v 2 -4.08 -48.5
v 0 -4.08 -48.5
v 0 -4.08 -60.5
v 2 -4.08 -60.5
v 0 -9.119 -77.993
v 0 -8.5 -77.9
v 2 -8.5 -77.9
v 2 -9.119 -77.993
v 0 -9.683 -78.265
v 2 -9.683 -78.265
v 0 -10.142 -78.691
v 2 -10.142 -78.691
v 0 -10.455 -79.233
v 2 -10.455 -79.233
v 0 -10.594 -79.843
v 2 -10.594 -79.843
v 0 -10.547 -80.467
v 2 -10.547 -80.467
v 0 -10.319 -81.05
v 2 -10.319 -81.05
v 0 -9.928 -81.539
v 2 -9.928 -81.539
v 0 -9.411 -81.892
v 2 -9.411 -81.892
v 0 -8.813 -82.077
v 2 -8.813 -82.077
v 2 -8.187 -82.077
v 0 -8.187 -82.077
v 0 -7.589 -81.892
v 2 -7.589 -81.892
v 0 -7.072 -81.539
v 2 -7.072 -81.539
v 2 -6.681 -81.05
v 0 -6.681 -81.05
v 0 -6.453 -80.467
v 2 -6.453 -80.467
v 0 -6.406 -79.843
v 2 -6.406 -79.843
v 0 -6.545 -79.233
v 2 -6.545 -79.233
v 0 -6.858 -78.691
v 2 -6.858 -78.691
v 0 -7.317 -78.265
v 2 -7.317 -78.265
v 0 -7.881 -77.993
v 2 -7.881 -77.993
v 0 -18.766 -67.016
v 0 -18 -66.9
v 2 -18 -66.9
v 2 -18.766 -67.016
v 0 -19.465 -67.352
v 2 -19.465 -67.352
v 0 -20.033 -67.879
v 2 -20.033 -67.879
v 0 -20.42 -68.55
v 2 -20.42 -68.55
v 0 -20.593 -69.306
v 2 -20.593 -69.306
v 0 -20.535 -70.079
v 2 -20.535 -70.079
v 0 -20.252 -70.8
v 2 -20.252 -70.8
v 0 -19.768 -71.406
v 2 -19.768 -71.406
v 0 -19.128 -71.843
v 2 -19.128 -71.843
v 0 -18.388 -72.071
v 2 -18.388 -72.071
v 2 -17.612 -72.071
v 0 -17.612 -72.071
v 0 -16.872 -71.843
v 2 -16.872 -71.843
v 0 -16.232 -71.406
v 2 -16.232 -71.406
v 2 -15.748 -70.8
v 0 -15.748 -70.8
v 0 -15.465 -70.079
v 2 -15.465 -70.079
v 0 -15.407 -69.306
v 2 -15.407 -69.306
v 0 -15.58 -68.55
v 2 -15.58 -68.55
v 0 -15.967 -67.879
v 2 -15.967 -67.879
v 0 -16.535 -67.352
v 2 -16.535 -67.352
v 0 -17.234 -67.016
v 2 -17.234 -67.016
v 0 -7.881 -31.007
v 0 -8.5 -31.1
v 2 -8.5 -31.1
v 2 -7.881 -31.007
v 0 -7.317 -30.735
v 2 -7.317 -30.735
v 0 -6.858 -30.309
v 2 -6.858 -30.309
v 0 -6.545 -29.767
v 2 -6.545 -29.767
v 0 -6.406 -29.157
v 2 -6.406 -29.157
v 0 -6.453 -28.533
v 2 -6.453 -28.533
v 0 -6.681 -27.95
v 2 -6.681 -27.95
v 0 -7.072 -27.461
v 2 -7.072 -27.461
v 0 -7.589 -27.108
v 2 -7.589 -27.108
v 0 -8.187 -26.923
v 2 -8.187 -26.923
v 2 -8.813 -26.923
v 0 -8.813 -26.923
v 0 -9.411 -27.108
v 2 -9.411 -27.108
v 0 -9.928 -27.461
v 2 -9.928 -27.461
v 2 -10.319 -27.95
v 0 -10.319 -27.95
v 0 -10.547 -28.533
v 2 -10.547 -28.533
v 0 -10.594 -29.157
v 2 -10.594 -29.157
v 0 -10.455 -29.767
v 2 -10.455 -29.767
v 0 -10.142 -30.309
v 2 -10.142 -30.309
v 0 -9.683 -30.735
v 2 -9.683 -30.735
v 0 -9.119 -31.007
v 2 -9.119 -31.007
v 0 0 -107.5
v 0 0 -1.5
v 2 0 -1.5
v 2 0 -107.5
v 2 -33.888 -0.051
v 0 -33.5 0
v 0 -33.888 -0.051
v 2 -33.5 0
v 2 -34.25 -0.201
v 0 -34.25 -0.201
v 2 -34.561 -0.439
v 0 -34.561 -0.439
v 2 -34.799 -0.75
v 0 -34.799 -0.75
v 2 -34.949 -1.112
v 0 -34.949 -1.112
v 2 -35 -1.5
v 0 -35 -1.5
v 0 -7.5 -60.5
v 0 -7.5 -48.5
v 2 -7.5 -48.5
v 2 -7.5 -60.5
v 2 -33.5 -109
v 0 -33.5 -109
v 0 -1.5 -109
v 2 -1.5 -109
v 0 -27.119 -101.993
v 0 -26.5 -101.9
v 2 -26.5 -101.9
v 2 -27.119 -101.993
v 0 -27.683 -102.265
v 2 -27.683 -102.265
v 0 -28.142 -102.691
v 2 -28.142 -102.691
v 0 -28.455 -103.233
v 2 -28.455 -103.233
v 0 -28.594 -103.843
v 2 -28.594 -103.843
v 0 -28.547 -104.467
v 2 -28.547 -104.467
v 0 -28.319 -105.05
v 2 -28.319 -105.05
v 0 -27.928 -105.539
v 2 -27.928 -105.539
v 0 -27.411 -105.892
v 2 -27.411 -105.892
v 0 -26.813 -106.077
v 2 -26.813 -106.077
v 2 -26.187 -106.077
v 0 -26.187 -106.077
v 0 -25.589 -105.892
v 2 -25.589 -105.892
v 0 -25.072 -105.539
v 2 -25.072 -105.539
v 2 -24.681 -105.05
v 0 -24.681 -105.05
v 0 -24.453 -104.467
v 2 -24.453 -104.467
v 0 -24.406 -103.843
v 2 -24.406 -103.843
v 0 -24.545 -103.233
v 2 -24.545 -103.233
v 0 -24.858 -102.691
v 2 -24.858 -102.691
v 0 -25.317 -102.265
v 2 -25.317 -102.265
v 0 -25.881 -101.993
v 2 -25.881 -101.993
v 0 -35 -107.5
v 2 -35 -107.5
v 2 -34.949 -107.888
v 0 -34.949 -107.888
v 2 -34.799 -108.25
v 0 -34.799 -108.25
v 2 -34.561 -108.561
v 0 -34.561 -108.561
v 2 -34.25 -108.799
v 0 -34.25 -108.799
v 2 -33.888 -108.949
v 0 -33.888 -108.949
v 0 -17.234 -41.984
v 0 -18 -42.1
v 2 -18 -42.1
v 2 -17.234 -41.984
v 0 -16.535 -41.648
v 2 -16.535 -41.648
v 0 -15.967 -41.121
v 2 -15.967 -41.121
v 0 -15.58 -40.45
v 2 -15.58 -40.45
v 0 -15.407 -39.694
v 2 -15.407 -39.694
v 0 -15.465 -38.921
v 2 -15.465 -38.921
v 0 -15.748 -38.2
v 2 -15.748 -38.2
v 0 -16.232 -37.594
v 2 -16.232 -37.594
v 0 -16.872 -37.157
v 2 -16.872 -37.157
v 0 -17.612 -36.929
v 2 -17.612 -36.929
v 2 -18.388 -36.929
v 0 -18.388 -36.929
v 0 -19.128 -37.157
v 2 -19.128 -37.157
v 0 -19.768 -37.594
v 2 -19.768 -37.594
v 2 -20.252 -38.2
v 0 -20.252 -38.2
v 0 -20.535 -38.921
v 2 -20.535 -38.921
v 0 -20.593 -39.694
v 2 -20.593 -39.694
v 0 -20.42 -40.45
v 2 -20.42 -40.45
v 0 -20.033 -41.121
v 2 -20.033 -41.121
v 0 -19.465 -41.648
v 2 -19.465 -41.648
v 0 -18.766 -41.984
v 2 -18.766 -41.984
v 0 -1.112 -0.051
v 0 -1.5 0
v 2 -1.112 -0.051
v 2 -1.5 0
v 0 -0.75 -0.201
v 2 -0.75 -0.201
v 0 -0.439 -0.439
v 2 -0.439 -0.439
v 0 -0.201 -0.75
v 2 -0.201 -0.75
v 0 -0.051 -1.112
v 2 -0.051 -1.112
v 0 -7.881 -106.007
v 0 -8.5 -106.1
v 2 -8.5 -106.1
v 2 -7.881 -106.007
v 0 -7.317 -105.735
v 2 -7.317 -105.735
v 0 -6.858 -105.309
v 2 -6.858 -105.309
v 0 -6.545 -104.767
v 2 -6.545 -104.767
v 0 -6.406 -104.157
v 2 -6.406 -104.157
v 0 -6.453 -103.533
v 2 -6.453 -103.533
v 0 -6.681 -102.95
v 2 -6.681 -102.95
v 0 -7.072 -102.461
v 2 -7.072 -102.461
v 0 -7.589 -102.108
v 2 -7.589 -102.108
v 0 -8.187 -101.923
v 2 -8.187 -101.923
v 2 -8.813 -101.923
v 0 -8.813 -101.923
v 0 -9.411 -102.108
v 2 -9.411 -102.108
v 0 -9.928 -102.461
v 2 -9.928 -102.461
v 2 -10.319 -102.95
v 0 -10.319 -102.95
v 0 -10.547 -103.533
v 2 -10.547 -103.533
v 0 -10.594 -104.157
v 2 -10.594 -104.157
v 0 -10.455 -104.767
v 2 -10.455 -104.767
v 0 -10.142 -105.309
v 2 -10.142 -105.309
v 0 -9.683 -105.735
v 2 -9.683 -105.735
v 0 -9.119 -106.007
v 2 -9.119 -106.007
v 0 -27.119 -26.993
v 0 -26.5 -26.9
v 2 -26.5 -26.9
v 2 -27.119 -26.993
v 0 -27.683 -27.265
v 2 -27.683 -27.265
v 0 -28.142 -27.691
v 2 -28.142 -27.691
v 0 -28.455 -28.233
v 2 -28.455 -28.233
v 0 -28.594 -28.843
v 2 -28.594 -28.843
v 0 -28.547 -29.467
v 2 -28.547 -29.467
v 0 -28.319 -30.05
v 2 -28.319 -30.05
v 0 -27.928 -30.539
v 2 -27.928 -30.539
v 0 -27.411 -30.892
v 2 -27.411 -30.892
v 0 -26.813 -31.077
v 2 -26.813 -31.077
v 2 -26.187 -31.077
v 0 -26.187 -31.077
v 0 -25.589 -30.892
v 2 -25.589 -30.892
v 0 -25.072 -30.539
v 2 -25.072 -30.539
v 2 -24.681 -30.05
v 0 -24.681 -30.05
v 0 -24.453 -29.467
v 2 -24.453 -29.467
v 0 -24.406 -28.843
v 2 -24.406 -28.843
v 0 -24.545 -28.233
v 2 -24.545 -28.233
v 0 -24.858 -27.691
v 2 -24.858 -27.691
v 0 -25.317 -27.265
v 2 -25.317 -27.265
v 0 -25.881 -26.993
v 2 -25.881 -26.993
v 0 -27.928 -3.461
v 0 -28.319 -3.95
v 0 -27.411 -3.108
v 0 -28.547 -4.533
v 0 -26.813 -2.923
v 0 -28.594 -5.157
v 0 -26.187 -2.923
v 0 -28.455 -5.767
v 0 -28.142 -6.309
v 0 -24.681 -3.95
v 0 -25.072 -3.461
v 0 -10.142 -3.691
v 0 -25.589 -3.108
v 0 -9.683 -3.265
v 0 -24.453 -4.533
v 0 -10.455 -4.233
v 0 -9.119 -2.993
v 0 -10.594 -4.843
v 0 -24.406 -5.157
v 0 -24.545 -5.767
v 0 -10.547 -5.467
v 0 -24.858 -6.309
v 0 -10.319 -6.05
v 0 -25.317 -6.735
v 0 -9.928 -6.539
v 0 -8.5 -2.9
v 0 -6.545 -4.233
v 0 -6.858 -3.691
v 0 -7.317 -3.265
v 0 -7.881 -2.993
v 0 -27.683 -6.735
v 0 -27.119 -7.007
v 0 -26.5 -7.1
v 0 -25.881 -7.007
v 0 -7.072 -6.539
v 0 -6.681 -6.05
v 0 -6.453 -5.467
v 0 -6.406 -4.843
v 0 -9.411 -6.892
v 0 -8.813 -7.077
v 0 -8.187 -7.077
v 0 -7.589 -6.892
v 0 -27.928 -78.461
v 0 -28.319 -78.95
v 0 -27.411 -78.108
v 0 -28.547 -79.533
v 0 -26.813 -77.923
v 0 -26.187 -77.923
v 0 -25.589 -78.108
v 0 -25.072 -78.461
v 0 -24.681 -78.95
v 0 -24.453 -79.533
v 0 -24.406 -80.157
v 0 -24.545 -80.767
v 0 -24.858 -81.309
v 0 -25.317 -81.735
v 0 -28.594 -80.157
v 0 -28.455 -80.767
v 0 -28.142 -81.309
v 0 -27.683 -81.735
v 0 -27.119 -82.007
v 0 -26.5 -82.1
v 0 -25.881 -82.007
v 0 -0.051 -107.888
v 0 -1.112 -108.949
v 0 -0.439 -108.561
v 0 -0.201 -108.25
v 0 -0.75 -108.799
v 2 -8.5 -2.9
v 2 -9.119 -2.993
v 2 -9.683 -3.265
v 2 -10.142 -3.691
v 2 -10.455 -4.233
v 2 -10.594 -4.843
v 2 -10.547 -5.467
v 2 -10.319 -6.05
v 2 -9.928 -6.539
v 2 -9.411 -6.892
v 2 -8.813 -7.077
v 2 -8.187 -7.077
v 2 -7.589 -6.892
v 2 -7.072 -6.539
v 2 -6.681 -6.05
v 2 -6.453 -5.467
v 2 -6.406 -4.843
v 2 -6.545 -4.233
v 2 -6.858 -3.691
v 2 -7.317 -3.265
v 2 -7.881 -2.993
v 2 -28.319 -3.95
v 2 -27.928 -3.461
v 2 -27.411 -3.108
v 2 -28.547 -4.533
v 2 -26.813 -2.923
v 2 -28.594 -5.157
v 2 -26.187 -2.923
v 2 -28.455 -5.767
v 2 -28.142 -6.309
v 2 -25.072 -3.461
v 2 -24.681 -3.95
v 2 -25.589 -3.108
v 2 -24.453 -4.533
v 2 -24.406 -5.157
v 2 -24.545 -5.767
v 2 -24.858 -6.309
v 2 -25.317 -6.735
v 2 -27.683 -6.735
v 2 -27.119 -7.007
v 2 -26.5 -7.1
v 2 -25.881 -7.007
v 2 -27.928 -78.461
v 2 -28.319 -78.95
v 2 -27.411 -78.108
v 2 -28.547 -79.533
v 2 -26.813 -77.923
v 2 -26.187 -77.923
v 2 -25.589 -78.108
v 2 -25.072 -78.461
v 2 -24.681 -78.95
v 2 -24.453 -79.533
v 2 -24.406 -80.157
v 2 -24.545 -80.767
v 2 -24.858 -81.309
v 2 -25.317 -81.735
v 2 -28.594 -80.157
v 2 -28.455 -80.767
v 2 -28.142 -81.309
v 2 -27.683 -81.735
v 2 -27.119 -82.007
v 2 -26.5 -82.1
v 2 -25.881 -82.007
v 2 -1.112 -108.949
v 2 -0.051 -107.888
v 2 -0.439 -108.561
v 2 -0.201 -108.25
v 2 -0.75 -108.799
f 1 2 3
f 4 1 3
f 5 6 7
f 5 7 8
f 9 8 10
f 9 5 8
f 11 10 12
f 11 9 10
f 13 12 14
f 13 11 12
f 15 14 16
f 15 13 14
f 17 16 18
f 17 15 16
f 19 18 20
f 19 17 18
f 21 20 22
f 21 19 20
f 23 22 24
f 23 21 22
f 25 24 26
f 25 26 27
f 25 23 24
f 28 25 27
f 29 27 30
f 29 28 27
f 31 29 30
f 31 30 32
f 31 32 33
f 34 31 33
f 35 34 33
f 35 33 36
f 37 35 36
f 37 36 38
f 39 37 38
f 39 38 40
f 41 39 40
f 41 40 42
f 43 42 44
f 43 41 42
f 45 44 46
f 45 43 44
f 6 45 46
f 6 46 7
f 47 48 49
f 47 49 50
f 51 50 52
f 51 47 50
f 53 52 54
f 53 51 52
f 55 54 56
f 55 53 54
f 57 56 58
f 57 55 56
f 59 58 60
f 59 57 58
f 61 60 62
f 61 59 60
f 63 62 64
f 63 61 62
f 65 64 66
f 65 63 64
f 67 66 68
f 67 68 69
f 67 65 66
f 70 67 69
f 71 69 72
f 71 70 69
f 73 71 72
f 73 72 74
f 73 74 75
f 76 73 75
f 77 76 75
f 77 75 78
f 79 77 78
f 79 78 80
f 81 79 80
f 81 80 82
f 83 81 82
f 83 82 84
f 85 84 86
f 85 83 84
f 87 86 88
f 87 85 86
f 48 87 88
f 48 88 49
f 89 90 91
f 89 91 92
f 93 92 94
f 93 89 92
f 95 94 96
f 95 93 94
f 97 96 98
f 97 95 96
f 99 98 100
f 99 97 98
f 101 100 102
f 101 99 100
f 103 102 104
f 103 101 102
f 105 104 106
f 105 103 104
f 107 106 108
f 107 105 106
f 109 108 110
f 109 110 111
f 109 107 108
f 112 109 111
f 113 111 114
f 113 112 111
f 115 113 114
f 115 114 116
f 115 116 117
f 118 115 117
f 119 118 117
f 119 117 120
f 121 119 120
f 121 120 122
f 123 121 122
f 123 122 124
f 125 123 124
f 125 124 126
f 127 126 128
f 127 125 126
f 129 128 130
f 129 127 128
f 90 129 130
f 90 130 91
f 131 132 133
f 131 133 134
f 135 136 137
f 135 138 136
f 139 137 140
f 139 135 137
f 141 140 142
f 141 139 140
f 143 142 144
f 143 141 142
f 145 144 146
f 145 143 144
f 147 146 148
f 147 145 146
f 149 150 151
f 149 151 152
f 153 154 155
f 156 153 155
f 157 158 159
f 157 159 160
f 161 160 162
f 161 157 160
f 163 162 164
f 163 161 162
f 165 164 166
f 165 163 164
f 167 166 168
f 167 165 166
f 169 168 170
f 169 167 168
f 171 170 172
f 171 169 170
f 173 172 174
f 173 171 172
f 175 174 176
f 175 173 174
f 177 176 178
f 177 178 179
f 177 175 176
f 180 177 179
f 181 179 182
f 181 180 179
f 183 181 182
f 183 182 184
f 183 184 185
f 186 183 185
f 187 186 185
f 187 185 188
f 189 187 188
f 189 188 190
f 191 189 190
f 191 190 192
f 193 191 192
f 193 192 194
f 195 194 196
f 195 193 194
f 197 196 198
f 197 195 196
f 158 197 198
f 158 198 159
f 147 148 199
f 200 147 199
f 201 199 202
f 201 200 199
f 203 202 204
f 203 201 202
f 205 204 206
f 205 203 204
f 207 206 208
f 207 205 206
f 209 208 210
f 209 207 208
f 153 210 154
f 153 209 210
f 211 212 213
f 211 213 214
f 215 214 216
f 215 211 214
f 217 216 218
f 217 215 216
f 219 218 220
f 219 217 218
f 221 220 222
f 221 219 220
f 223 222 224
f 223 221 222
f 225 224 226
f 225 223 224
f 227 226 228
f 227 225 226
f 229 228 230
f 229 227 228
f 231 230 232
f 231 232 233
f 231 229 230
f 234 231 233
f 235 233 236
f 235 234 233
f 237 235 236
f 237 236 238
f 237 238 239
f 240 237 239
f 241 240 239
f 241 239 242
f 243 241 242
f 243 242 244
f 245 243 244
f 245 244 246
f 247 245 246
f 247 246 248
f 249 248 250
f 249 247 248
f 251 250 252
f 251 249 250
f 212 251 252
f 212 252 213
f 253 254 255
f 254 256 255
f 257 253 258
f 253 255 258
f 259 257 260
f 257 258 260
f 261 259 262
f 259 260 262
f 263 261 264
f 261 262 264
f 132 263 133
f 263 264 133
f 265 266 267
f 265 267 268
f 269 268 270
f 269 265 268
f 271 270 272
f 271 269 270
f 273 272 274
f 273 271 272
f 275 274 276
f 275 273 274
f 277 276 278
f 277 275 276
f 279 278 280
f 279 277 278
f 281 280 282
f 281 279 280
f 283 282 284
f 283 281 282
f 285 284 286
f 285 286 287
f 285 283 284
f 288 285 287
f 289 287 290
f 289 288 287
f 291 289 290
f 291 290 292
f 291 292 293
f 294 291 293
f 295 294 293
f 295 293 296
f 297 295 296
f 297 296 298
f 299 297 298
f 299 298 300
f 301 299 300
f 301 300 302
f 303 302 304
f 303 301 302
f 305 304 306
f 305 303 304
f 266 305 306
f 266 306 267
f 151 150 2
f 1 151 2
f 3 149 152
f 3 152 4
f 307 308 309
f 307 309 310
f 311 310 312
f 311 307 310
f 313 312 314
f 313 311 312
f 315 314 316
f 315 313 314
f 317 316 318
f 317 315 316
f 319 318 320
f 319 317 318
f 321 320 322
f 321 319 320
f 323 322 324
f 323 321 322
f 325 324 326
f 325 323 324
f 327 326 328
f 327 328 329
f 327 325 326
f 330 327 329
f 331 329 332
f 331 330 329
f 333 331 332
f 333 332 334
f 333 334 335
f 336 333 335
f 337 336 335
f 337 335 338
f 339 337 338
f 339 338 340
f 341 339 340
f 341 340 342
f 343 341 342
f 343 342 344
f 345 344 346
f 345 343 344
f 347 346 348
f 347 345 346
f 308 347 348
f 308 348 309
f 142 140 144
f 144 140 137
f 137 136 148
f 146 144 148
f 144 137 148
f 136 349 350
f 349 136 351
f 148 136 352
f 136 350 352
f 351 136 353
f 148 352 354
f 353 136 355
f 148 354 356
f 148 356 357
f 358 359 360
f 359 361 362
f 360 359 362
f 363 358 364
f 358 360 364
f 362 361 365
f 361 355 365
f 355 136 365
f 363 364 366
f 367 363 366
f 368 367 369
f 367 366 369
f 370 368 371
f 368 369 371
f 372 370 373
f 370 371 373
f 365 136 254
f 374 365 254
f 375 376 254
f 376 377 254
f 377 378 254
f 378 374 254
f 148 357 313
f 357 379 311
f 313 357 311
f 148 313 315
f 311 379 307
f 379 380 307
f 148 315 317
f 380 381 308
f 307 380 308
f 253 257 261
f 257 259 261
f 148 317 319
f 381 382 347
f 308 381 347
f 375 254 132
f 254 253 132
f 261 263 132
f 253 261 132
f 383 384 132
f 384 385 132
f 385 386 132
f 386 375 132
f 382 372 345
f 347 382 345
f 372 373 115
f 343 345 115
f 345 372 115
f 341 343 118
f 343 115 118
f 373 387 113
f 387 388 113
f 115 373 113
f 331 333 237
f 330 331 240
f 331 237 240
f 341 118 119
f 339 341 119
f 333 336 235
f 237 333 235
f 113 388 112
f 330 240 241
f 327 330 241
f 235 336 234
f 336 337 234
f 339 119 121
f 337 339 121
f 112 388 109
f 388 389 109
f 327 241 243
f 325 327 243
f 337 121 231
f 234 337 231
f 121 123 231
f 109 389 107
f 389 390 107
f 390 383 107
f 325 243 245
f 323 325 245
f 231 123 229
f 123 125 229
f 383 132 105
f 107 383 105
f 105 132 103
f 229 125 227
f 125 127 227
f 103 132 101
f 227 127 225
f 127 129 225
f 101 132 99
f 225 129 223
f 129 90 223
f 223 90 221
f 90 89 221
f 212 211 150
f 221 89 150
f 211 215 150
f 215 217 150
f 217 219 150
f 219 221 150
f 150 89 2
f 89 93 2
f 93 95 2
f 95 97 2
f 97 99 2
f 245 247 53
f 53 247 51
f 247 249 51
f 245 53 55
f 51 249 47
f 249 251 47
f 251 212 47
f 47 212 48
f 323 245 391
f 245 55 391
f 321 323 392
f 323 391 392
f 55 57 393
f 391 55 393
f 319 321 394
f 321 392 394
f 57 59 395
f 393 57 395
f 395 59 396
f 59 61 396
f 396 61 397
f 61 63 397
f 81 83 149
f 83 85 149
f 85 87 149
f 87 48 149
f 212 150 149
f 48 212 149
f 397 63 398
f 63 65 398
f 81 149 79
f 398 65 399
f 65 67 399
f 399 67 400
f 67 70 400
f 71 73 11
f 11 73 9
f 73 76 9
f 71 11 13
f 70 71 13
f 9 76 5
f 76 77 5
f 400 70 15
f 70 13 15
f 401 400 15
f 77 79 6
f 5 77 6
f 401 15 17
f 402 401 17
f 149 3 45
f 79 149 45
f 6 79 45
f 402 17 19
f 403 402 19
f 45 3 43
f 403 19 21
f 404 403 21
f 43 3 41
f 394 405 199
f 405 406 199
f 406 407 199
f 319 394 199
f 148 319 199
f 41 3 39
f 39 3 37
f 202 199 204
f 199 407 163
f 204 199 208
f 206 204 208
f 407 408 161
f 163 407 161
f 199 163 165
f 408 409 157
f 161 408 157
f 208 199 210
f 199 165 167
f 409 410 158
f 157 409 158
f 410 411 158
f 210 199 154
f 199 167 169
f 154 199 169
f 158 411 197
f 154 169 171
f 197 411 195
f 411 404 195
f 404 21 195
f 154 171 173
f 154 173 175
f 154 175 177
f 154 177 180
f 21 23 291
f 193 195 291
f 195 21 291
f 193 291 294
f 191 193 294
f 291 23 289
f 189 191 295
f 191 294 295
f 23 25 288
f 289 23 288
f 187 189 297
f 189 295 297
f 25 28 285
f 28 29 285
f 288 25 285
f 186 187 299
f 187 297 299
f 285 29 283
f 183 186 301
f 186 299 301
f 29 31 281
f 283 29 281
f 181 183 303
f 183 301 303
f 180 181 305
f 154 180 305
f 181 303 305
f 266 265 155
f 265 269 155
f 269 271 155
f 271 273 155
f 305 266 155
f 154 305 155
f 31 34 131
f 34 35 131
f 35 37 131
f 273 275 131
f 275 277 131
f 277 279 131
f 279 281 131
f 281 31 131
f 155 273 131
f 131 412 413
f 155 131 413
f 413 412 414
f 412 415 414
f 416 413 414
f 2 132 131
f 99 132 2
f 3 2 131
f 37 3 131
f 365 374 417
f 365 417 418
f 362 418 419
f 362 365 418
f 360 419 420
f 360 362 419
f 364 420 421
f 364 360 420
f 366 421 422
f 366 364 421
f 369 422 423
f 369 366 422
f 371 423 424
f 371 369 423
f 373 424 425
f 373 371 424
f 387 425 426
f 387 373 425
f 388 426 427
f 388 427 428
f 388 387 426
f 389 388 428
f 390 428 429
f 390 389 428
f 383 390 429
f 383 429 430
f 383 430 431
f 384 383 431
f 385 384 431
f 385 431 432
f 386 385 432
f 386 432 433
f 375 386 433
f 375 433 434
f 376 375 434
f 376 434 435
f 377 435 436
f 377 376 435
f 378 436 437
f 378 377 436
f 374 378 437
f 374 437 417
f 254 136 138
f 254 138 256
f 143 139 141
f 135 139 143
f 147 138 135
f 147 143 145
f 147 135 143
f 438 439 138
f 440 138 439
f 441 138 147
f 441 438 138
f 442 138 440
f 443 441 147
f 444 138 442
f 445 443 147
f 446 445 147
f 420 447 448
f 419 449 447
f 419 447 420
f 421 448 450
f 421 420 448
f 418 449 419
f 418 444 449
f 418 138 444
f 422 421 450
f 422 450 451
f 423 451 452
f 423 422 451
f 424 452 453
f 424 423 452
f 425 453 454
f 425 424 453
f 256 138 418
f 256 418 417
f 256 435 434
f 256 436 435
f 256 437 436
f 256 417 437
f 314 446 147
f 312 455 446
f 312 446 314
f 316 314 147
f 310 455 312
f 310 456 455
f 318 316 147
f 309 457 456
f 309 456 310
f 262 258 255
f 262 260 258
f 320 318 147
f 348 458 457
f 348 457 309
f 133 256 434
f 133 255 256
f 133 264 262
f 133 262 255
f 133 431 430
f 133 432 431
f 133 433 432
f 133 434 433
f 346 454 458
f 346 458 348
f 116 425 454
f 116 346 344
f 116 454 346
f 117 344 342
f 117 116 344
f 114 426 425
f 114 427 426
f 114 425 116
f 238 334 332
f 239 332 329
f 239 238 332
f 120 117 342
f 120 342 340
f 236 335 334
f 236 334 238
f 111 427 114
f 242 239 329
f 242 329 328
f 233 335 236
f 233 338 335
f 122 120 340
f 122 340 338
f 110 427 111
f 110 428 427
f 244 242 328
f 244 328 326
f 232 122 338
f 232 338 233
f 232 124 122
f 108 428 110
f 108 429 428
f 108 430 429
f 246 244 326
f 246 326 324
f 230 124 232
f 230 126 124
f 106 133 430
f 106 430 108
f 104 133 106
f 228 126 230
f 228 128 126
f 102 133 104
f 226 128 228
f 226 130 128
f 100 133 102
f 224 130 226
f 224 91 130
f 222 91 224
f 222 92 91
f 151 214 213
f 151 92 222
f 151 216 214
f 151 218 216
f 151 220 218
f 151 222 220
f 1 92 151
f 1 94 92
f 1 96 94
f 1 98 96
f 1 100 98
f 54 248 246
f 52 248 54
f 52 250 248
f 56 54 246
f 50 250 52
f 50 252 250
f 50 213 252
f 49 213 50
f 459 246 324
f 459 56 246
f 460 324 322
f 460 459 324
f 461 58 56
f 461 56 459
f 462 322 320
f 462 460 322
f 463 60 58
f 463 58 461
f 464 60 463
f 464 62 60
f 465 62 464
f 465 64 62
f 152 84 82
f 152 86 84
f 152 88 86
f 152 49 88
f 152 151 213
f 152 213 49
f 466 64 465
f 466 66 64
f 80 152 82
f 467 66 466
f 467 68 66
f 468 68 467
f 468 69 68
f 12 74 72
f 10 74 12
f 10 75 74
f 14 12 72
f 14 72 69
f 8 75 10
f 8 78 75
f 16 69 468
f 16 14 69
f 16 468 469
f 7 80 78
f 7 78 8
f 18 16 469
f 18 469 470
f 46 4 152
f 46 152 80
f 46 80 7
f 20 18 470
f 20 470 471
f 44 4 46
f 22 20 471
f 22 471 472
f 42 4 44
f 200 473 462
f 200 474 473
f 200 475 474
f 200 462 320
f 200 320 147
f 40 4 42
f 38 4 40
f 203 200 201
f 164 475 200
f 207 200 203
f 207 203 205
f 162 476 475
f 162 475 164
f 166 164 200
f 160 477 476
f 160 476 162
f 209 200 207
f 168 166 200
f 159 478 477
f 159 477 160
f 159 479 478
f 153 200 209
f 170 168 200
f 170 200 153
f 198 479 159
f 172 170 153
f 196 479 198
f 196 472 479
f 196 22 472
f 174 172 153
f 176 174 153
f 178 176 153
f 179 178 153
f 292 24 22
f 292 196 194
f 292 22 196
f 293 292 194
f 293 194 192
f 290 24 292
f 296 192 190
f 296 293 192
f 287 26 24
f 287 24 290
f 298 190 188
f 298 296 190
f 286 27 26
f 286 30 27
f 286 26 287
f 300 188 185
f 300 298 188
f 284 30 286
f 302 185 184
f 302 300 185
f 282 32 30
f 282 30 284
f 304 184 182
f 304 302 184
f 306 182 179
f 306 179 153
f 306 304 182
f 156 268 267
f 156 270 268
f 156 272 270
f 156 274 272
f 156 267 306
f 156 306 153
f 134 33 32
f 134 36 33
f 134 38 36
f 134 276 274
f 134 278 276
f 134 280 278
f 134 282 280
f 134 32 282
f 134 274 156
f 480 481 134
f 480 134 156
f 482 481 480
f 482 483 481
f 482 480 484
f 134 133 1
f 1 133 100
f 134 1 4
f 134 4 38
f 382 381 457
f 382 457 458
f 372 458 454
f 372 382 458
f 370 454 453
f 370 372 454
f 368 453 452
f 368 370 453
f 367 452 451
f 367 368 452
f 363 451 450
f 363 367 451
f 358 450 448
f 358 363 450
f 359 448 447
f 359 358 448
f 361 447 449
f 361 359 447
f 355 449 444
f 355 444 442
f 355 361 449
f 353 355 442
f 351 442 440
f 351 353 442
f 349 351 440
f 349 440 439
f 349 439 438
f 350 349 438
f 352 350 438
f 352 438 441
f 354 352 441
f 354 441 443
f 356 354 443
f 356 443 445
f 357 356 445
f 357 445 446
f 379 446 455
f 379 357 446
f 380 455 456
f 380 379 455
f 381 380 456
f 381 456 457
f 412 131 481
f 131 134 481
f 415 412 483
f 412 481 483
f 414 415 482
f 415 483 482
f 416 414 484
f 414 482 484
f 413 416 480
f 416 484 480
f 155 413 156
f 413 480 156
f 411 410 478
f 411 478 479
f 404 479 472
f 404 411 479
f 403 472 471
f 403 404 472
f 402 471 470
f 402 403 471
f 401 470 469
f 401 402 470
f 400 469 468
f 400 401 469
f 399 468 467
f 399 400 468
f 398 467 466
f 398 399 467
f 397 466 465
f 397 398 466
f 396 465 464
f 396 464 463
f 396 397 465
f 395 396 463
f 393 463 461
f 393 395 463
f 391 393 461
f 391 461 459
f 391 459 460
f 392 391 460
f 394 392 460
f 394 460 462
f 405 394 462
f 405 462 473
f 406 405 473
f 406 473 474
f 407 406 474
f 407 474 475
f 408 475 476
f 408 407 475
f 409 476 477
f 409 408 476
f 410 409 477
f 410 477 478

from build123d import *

# Parameters (mm, degrees)
SKETCH1_W           = 109
SKETCH1_H           = 35
SKETCH1_R           = 2.1
SKETCH1_R_2         = 2.6
SKETCH1_W_2         = 12
SKETCH1_H_2         = 3.42
BOSS_EXTRUDE1_DEPTH = 2
FILLET1_R           = 1.5


with BuildPart() as part:
    # Sketch1 → Boss-Extrude1 (new body)
    with BuildSketch(Plane(origin=(0, 0, 0), x_dir=(0, 0, -1), z_dir=(1, 0, 0))):
        with Locations((54.5, -17.5)):
            Rectangle(SKETCH1_W, SKETCH1_H)
        with Locations((104, -8.5)):
            Circle(SKETCH1_R, mode=Mode.SUBTRACT)
        with Locations(Location((104, -26.5, 0), (0, 0, 180))):
            Circle(SKETCH1_R, mode=Mode.SUBTRACT)
        with Locations((80, -26.5)):
            Circle(SKETCH1_R, mode=Mode.SUBTRACT)
        with Locations(Location((80, -8.5, 0), (0, 0, 180))):
            Circle(SKETCH1_R, mode=Mode.SUBTRACT)
        with Locations((5, -26.5)):
            Circle(SKETCH1_R, mode=Mode.SUBTRACT)
        with Locations(Location((5, -8.5, 0), (0, 0, 180))):
            Circle(SKETCH1_R, mode=Mode.SUBTRACT)
        with Locations(Location((29, -26.5, 0), (0, 0, 180))):
            Circle(SKETCH1_R, mode=Mode.SUBTRACT)
        with Locations((29, -8.5)):
            Circle(SKETCH1_R, mode=Mode.SUBTRACT)
        with Locations((39.5, -18)):
            Circle(SKETCH1_R_2, mode=Mode.SUBTRACT)
        with Locations(Location((69.5, -18, 0), (0, 0, 180))):
            Circle(SKETCH1_R_2, mode=Mode.SUBTRACT)
        with Locations((54.5, -5.79)):
            Rectangle(SKETCH1_W_2, SKETCH1_H_2, mode=Mode.SUBTRACT)
    extrude(amount=BOSS_EXTRUDE1_DEPTH)

    # Fillet1
    fillet1_edges = [part.edges().sort_by_distance(p)[0] for p in [
        (1, 0, 0),
        (1, 0, -109),
        (1, -35, -109),
        (1, -35, 0),
    ]]
    fillet(fillet1_edges, radius=FILLET1_R)


solid = part.part
